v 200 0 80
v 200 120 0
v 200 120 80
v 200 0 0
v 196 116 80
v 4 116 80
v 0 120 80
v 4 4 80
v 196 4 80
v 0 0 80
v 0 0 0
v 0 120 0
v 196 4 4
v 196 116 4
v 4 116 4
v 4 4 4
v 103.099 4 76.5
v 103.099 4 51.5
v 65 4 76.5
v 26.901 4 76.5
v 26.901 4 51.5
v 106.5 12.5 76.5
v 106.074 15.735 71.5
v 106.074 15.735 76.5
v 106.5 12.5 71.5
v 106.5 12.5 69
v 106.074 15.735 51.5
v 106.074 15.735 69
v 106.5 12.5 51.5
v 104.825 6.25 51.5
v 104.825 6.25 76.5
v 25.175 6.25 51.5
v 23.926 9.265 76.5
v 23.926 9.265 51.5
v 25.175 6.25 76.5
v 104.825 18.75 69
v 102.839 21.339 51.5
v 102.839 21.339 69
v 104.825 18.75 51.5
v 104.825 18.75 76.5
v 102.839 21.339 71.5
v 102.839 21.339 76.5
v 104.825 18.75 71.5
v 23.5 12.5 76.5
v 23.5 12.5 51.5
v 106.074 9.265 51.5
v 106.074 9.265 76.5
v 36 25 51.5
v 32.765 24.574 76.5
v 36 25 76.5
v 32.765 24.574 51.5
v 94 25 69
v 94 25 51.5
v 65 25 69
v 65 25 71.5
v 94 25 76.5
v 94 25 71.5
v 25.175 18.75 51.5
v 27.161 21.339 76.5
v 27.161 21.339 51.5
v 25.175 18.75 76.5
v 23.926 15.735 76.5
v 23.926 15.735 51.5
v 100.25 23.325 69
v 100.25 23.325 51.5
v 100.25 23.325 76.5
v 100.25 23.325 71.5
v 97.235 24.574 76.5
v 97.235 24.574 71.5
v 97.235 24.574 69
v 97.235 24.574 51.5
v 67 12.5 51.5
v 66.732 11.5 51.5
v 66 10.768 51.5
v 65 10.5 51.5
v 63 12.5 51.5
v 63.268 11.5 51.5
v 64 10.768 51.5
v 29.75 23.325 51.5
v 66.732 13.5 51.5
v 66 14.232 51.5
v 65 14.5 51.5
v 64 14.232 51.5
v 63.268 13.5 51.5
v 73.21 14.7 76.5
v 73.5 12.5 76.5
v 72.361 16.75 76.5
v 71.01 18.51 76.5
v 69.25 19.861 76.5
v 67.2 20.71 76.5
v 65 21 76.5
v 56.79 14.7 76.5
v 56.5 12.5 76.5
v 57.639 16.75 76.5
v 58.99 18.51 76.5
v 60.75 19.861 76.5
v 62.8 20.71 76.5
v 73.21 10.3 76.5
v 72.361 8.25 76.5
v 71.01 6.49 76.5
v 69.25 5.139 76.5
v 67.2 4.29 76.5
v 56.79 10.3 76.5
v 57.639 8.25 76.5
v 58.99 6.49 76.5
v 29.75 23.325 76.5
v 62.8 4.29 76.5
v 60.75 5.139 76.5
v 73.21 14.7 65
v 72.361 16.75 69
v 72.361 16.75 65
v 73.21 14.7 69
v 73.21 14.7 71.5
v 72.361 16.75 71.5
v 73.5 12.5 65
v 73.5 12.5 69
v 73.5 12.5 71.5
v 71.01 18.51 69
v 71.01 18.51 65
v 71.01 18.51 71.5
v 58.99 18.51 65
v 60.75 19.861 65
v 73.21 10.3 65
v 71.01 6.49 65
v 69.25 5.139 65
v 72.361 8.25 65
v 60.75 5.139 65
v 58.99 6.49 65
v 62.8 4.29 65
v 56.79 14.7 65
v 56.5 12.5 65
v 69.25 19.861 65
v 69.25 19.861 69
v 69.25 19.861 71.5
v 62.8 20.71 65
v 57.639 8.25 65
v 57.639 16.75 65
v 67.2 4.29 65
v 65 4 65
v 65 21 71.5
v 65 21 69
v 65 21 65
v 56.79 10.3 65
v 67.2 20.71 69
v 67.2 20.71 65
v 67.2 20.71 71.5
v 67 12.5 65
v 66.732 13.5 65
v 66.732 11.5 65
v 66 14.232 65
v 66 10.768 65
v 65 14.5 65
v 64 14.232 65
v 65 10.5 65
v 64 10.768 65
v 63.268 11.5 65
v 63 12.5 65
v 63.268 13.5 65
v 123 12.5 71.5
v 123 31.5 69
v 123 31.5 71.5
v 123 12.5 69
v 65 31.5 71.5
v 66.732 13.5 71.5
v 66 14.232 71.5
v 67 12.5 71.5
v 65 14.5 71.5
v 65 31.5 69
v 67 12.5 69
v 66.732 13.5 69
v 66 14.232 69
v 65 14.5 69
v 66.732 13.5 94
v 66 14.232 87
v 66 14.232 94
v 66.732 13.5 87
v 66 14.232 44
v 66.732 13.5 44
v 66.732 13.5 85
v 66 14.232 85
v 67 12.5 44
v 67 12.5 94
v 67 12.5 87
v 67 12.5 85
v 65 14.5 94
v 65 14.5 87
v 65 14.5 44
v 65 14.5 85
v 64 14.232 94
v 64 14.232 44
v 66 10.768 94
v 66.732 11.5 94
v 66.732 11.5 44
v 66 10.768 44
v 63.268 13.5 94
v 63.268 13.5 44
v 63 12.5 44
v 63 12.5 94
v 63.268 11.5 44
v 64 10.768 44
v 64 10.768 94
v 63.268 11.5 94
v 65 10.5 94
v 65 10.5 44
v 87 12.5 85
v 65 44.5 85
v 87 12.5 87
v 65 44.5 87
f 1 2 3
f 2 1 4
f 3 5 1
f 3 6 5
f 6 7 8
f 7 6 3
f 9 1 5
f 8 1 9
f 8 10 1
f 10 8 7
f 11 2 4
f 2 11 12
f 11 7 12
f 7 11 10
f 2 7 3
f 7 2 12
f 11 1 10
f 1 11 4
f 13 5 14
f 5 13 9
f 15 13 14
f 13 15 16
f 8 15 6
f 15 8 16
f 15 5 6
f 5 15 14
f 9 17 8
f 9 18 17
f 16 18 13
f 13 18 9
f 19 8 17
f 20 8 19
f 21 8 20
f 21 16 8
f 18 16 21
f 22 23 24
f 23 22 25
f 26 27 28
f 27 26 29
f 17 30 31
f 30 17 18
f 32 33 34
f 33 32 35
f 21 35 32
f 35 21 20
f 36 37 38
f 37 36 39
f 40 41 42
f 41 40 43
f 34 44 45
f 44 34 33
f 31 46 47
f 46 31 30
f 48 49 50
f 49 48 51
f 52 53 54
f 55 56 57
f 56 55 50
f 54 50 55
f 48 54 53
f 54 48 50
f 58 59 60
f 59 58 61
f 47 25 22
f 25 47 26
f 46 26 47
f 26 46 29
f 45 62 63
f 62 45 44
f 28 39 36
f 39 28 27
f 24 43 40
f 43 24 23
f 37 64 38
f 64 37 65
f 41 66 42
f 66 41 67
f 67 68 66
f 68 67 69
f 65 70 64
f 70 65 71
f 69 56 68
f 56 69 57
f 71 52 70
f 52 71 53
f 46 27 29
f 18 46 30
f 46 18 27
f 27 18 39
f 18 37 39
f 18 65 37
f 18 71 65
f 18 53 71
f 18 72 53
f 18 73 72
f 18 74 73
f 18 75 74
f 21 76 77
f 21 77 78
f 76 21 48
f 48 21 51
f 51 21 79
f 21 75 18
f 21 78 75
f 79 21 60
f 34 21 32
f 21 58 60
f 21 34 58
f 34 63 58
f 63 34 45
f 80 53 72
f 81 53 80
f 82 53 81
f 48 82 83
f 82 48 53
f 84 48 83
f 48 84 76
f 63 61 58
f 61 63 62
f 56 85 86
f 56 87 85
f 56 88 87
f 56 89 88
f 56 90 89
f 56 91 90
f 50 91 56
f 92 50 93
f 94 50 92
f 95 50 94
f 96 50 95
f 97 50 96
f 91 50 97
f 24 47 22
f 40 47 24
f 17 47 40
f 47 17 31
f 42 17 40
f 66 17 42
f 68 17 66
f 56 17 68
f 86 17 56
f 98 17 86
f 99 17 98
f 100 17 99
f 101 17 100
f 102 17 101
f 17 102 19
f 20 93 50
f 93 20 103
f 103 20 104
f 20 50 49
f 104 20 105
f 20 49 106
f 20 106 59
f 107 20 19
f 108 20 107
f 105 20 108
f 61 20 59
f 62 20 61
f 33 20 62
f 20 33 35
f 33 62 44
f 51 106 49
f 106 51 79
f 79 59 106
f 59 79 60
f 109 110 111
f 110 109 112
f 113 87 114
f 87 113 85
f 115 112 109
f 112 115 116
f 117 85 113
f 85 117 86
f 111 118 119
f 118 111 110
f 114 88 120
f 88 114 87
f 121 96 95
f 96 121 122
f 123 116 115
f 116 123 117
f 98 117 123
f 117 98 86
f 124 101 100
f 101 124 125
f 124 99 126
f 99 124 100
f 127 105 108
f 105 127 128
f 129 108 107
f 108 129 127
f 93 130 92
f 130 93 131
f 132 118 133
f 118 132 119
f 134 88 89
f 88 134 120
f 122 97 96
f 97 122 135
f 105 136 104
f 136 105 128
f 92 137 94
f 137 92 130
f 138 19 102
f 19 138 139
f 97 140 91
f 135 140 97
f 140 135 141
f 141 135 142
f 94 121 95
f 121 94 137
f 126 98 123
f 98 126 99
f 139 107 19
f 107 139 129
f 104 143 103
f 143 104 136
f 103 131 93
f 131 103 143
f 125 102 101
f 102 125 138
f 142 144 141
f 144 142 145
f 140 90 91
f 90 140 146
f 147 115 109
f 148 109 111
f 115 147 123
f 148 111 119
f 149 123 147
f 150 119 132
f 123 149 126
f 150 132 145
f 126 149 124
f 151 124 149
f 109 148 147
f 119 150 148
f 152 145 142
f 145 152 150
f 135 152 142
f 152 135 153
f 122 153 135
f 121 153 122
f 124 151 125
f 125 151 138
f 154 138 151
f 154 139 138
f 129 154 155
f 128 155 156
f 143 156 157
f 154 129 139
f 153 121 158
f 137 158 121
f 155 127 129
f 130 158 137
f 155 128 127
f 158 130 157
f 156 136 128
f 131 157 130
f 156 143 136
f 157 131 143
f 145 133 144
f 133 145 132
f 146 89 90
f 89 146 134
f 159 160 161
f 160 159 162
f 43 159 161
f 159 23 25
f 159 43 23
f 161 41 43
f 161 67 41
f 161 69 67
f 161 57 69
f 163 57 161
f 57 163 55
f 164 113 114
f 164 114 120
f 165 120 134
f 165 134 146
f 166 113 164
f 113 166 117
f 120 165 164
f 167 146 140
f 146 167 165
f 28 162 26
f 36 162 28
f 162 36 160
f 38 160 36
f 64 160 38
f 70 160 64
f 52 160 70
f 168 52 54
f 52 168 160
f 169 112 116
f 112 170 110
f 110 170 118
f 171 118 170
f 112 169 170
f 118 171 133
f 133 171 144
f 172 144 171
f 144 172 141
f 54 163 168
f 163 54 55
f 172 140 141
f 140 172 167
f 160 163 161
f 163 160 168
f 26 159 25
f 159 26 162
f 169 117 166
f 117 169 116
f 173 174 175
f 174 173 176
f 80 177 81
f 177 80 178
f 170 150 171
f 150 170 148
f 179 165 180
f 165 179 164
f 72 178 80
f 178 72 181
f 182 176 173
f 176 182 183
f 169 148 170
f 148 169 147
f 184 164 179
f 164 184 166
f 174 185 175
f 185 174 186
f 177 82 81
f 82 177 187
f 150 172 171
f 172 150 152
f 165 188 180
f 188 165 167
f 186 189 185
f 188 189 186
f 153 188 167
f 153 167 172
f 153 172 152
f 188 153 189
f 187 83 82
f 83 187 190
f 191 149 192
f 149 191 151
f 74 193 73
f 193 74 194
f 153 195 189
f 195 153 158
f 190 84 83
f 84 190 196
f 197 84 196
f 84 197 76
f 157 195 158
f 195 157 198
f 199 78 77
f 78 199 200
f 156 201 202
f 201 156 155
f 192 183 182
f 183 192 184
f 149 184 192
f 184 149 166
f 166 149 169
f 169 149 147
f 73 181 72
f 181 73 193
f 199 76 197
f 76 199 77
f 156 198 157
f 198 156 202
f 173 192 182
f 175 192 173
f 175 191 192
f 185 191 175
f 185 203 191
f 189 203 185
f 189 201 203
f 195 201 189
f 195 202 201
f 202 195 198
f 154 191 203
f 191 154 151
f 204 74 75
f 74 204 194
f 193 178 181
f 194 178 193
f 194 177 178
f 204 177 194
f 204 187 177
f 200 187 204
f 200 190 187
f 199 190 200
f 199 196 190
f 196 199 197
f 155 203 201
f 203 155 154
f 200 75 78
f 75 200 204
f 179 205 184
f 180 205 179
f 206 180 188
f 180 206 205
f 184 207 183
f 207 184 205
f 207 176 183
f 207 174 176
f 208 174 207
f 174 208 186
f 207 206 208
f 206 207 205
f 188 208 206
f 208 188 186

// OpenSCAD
// Box with Boat
box_length = 200;       // [100:5:400]
box_width = 120;        // [60:5:250]
box_height = 80;        // [30:5:150]
wall_thickness = 4;     // [2:0.5:8]
box_color = "SaddleBrown";

boat_length = 70;       // [40:5:120]
boat_width = 25;        // [15:1:50]
boat_hull_depth = 12;   // [6:1:25]
mast_height = 50;       // [20:5:100]
sail_color = "LightGray";
deck_color = "Tan";
hull_color = "Black";

// ---- BOX ----
color(box_color)
difference() {
    // Outer box
    cube([box_length, box_width, box_height]);
    
    // Hollow interior (open at top)
    translate([wall_thickness, wall_thickness, wall_thickness])
        cube([box_length - wall_thickness * 2, box_width - wall_thickness * 2, box_height - wall_thickness]);
}

// ---- BOAT ----
boat_x = box_length / 2 - boat_length / 2;
boat_y = boat_width / 2;
boat_z = box_height - wall_thickness - boat_hull_depth;

// Hull
translate([boat_x, boat_y, boat_z])
color(hull_color)
difference() {
    // Main hull body - rounded boat shape
    hull() {
        // Front tip (rounded prow)
        translate([-(boat_length / 2 - 6), 0, 0])
            cylinder(h = boat_width, r = boat_width / 2, center = true, $fn = 24);
        // Back tip (rounded stern)
        translate([boat_length / 2 - 6, 0, 0])
            cylinder(h = boat_width, r = boat_width / 2, center = true, $fn = 24);
        // Mid section
        translate([0, 0, 0])
            cylinder(h = boat_width, r = boat_width / 2, center = true, $fn = 24);
    }
    // Carve out interior
    translate([0, 0, 1])
        cylinder(h = boat_hull_depth + 10, r = boat_width / 2 - wall_thickness, center = false, $fn = 24);
}

// Deck
translate([boat_x, boat_y, boat_z + boat_hull_depth / 2 - 1])
color(deck_color)
cube([boat_length - 12, boat_width - 6, 2.5]);

// Mast
translate([boat_x, boat_y, boat_z + boat_hull_depth / 2 - 1])
color("Brown")
cylinder(h = mast_height, r = 2, center = true, $fn = 12);

// Sail - triangular
translate([boat_x, boat_y, boat_z + boat_hull_depth / 2 + mast_height / 2 - 10])
color(sail_color)
linear_extrude(height = 2, center = false)
polygon(points=[[0,0],[0,mast_height - 18],[22,0]]);
